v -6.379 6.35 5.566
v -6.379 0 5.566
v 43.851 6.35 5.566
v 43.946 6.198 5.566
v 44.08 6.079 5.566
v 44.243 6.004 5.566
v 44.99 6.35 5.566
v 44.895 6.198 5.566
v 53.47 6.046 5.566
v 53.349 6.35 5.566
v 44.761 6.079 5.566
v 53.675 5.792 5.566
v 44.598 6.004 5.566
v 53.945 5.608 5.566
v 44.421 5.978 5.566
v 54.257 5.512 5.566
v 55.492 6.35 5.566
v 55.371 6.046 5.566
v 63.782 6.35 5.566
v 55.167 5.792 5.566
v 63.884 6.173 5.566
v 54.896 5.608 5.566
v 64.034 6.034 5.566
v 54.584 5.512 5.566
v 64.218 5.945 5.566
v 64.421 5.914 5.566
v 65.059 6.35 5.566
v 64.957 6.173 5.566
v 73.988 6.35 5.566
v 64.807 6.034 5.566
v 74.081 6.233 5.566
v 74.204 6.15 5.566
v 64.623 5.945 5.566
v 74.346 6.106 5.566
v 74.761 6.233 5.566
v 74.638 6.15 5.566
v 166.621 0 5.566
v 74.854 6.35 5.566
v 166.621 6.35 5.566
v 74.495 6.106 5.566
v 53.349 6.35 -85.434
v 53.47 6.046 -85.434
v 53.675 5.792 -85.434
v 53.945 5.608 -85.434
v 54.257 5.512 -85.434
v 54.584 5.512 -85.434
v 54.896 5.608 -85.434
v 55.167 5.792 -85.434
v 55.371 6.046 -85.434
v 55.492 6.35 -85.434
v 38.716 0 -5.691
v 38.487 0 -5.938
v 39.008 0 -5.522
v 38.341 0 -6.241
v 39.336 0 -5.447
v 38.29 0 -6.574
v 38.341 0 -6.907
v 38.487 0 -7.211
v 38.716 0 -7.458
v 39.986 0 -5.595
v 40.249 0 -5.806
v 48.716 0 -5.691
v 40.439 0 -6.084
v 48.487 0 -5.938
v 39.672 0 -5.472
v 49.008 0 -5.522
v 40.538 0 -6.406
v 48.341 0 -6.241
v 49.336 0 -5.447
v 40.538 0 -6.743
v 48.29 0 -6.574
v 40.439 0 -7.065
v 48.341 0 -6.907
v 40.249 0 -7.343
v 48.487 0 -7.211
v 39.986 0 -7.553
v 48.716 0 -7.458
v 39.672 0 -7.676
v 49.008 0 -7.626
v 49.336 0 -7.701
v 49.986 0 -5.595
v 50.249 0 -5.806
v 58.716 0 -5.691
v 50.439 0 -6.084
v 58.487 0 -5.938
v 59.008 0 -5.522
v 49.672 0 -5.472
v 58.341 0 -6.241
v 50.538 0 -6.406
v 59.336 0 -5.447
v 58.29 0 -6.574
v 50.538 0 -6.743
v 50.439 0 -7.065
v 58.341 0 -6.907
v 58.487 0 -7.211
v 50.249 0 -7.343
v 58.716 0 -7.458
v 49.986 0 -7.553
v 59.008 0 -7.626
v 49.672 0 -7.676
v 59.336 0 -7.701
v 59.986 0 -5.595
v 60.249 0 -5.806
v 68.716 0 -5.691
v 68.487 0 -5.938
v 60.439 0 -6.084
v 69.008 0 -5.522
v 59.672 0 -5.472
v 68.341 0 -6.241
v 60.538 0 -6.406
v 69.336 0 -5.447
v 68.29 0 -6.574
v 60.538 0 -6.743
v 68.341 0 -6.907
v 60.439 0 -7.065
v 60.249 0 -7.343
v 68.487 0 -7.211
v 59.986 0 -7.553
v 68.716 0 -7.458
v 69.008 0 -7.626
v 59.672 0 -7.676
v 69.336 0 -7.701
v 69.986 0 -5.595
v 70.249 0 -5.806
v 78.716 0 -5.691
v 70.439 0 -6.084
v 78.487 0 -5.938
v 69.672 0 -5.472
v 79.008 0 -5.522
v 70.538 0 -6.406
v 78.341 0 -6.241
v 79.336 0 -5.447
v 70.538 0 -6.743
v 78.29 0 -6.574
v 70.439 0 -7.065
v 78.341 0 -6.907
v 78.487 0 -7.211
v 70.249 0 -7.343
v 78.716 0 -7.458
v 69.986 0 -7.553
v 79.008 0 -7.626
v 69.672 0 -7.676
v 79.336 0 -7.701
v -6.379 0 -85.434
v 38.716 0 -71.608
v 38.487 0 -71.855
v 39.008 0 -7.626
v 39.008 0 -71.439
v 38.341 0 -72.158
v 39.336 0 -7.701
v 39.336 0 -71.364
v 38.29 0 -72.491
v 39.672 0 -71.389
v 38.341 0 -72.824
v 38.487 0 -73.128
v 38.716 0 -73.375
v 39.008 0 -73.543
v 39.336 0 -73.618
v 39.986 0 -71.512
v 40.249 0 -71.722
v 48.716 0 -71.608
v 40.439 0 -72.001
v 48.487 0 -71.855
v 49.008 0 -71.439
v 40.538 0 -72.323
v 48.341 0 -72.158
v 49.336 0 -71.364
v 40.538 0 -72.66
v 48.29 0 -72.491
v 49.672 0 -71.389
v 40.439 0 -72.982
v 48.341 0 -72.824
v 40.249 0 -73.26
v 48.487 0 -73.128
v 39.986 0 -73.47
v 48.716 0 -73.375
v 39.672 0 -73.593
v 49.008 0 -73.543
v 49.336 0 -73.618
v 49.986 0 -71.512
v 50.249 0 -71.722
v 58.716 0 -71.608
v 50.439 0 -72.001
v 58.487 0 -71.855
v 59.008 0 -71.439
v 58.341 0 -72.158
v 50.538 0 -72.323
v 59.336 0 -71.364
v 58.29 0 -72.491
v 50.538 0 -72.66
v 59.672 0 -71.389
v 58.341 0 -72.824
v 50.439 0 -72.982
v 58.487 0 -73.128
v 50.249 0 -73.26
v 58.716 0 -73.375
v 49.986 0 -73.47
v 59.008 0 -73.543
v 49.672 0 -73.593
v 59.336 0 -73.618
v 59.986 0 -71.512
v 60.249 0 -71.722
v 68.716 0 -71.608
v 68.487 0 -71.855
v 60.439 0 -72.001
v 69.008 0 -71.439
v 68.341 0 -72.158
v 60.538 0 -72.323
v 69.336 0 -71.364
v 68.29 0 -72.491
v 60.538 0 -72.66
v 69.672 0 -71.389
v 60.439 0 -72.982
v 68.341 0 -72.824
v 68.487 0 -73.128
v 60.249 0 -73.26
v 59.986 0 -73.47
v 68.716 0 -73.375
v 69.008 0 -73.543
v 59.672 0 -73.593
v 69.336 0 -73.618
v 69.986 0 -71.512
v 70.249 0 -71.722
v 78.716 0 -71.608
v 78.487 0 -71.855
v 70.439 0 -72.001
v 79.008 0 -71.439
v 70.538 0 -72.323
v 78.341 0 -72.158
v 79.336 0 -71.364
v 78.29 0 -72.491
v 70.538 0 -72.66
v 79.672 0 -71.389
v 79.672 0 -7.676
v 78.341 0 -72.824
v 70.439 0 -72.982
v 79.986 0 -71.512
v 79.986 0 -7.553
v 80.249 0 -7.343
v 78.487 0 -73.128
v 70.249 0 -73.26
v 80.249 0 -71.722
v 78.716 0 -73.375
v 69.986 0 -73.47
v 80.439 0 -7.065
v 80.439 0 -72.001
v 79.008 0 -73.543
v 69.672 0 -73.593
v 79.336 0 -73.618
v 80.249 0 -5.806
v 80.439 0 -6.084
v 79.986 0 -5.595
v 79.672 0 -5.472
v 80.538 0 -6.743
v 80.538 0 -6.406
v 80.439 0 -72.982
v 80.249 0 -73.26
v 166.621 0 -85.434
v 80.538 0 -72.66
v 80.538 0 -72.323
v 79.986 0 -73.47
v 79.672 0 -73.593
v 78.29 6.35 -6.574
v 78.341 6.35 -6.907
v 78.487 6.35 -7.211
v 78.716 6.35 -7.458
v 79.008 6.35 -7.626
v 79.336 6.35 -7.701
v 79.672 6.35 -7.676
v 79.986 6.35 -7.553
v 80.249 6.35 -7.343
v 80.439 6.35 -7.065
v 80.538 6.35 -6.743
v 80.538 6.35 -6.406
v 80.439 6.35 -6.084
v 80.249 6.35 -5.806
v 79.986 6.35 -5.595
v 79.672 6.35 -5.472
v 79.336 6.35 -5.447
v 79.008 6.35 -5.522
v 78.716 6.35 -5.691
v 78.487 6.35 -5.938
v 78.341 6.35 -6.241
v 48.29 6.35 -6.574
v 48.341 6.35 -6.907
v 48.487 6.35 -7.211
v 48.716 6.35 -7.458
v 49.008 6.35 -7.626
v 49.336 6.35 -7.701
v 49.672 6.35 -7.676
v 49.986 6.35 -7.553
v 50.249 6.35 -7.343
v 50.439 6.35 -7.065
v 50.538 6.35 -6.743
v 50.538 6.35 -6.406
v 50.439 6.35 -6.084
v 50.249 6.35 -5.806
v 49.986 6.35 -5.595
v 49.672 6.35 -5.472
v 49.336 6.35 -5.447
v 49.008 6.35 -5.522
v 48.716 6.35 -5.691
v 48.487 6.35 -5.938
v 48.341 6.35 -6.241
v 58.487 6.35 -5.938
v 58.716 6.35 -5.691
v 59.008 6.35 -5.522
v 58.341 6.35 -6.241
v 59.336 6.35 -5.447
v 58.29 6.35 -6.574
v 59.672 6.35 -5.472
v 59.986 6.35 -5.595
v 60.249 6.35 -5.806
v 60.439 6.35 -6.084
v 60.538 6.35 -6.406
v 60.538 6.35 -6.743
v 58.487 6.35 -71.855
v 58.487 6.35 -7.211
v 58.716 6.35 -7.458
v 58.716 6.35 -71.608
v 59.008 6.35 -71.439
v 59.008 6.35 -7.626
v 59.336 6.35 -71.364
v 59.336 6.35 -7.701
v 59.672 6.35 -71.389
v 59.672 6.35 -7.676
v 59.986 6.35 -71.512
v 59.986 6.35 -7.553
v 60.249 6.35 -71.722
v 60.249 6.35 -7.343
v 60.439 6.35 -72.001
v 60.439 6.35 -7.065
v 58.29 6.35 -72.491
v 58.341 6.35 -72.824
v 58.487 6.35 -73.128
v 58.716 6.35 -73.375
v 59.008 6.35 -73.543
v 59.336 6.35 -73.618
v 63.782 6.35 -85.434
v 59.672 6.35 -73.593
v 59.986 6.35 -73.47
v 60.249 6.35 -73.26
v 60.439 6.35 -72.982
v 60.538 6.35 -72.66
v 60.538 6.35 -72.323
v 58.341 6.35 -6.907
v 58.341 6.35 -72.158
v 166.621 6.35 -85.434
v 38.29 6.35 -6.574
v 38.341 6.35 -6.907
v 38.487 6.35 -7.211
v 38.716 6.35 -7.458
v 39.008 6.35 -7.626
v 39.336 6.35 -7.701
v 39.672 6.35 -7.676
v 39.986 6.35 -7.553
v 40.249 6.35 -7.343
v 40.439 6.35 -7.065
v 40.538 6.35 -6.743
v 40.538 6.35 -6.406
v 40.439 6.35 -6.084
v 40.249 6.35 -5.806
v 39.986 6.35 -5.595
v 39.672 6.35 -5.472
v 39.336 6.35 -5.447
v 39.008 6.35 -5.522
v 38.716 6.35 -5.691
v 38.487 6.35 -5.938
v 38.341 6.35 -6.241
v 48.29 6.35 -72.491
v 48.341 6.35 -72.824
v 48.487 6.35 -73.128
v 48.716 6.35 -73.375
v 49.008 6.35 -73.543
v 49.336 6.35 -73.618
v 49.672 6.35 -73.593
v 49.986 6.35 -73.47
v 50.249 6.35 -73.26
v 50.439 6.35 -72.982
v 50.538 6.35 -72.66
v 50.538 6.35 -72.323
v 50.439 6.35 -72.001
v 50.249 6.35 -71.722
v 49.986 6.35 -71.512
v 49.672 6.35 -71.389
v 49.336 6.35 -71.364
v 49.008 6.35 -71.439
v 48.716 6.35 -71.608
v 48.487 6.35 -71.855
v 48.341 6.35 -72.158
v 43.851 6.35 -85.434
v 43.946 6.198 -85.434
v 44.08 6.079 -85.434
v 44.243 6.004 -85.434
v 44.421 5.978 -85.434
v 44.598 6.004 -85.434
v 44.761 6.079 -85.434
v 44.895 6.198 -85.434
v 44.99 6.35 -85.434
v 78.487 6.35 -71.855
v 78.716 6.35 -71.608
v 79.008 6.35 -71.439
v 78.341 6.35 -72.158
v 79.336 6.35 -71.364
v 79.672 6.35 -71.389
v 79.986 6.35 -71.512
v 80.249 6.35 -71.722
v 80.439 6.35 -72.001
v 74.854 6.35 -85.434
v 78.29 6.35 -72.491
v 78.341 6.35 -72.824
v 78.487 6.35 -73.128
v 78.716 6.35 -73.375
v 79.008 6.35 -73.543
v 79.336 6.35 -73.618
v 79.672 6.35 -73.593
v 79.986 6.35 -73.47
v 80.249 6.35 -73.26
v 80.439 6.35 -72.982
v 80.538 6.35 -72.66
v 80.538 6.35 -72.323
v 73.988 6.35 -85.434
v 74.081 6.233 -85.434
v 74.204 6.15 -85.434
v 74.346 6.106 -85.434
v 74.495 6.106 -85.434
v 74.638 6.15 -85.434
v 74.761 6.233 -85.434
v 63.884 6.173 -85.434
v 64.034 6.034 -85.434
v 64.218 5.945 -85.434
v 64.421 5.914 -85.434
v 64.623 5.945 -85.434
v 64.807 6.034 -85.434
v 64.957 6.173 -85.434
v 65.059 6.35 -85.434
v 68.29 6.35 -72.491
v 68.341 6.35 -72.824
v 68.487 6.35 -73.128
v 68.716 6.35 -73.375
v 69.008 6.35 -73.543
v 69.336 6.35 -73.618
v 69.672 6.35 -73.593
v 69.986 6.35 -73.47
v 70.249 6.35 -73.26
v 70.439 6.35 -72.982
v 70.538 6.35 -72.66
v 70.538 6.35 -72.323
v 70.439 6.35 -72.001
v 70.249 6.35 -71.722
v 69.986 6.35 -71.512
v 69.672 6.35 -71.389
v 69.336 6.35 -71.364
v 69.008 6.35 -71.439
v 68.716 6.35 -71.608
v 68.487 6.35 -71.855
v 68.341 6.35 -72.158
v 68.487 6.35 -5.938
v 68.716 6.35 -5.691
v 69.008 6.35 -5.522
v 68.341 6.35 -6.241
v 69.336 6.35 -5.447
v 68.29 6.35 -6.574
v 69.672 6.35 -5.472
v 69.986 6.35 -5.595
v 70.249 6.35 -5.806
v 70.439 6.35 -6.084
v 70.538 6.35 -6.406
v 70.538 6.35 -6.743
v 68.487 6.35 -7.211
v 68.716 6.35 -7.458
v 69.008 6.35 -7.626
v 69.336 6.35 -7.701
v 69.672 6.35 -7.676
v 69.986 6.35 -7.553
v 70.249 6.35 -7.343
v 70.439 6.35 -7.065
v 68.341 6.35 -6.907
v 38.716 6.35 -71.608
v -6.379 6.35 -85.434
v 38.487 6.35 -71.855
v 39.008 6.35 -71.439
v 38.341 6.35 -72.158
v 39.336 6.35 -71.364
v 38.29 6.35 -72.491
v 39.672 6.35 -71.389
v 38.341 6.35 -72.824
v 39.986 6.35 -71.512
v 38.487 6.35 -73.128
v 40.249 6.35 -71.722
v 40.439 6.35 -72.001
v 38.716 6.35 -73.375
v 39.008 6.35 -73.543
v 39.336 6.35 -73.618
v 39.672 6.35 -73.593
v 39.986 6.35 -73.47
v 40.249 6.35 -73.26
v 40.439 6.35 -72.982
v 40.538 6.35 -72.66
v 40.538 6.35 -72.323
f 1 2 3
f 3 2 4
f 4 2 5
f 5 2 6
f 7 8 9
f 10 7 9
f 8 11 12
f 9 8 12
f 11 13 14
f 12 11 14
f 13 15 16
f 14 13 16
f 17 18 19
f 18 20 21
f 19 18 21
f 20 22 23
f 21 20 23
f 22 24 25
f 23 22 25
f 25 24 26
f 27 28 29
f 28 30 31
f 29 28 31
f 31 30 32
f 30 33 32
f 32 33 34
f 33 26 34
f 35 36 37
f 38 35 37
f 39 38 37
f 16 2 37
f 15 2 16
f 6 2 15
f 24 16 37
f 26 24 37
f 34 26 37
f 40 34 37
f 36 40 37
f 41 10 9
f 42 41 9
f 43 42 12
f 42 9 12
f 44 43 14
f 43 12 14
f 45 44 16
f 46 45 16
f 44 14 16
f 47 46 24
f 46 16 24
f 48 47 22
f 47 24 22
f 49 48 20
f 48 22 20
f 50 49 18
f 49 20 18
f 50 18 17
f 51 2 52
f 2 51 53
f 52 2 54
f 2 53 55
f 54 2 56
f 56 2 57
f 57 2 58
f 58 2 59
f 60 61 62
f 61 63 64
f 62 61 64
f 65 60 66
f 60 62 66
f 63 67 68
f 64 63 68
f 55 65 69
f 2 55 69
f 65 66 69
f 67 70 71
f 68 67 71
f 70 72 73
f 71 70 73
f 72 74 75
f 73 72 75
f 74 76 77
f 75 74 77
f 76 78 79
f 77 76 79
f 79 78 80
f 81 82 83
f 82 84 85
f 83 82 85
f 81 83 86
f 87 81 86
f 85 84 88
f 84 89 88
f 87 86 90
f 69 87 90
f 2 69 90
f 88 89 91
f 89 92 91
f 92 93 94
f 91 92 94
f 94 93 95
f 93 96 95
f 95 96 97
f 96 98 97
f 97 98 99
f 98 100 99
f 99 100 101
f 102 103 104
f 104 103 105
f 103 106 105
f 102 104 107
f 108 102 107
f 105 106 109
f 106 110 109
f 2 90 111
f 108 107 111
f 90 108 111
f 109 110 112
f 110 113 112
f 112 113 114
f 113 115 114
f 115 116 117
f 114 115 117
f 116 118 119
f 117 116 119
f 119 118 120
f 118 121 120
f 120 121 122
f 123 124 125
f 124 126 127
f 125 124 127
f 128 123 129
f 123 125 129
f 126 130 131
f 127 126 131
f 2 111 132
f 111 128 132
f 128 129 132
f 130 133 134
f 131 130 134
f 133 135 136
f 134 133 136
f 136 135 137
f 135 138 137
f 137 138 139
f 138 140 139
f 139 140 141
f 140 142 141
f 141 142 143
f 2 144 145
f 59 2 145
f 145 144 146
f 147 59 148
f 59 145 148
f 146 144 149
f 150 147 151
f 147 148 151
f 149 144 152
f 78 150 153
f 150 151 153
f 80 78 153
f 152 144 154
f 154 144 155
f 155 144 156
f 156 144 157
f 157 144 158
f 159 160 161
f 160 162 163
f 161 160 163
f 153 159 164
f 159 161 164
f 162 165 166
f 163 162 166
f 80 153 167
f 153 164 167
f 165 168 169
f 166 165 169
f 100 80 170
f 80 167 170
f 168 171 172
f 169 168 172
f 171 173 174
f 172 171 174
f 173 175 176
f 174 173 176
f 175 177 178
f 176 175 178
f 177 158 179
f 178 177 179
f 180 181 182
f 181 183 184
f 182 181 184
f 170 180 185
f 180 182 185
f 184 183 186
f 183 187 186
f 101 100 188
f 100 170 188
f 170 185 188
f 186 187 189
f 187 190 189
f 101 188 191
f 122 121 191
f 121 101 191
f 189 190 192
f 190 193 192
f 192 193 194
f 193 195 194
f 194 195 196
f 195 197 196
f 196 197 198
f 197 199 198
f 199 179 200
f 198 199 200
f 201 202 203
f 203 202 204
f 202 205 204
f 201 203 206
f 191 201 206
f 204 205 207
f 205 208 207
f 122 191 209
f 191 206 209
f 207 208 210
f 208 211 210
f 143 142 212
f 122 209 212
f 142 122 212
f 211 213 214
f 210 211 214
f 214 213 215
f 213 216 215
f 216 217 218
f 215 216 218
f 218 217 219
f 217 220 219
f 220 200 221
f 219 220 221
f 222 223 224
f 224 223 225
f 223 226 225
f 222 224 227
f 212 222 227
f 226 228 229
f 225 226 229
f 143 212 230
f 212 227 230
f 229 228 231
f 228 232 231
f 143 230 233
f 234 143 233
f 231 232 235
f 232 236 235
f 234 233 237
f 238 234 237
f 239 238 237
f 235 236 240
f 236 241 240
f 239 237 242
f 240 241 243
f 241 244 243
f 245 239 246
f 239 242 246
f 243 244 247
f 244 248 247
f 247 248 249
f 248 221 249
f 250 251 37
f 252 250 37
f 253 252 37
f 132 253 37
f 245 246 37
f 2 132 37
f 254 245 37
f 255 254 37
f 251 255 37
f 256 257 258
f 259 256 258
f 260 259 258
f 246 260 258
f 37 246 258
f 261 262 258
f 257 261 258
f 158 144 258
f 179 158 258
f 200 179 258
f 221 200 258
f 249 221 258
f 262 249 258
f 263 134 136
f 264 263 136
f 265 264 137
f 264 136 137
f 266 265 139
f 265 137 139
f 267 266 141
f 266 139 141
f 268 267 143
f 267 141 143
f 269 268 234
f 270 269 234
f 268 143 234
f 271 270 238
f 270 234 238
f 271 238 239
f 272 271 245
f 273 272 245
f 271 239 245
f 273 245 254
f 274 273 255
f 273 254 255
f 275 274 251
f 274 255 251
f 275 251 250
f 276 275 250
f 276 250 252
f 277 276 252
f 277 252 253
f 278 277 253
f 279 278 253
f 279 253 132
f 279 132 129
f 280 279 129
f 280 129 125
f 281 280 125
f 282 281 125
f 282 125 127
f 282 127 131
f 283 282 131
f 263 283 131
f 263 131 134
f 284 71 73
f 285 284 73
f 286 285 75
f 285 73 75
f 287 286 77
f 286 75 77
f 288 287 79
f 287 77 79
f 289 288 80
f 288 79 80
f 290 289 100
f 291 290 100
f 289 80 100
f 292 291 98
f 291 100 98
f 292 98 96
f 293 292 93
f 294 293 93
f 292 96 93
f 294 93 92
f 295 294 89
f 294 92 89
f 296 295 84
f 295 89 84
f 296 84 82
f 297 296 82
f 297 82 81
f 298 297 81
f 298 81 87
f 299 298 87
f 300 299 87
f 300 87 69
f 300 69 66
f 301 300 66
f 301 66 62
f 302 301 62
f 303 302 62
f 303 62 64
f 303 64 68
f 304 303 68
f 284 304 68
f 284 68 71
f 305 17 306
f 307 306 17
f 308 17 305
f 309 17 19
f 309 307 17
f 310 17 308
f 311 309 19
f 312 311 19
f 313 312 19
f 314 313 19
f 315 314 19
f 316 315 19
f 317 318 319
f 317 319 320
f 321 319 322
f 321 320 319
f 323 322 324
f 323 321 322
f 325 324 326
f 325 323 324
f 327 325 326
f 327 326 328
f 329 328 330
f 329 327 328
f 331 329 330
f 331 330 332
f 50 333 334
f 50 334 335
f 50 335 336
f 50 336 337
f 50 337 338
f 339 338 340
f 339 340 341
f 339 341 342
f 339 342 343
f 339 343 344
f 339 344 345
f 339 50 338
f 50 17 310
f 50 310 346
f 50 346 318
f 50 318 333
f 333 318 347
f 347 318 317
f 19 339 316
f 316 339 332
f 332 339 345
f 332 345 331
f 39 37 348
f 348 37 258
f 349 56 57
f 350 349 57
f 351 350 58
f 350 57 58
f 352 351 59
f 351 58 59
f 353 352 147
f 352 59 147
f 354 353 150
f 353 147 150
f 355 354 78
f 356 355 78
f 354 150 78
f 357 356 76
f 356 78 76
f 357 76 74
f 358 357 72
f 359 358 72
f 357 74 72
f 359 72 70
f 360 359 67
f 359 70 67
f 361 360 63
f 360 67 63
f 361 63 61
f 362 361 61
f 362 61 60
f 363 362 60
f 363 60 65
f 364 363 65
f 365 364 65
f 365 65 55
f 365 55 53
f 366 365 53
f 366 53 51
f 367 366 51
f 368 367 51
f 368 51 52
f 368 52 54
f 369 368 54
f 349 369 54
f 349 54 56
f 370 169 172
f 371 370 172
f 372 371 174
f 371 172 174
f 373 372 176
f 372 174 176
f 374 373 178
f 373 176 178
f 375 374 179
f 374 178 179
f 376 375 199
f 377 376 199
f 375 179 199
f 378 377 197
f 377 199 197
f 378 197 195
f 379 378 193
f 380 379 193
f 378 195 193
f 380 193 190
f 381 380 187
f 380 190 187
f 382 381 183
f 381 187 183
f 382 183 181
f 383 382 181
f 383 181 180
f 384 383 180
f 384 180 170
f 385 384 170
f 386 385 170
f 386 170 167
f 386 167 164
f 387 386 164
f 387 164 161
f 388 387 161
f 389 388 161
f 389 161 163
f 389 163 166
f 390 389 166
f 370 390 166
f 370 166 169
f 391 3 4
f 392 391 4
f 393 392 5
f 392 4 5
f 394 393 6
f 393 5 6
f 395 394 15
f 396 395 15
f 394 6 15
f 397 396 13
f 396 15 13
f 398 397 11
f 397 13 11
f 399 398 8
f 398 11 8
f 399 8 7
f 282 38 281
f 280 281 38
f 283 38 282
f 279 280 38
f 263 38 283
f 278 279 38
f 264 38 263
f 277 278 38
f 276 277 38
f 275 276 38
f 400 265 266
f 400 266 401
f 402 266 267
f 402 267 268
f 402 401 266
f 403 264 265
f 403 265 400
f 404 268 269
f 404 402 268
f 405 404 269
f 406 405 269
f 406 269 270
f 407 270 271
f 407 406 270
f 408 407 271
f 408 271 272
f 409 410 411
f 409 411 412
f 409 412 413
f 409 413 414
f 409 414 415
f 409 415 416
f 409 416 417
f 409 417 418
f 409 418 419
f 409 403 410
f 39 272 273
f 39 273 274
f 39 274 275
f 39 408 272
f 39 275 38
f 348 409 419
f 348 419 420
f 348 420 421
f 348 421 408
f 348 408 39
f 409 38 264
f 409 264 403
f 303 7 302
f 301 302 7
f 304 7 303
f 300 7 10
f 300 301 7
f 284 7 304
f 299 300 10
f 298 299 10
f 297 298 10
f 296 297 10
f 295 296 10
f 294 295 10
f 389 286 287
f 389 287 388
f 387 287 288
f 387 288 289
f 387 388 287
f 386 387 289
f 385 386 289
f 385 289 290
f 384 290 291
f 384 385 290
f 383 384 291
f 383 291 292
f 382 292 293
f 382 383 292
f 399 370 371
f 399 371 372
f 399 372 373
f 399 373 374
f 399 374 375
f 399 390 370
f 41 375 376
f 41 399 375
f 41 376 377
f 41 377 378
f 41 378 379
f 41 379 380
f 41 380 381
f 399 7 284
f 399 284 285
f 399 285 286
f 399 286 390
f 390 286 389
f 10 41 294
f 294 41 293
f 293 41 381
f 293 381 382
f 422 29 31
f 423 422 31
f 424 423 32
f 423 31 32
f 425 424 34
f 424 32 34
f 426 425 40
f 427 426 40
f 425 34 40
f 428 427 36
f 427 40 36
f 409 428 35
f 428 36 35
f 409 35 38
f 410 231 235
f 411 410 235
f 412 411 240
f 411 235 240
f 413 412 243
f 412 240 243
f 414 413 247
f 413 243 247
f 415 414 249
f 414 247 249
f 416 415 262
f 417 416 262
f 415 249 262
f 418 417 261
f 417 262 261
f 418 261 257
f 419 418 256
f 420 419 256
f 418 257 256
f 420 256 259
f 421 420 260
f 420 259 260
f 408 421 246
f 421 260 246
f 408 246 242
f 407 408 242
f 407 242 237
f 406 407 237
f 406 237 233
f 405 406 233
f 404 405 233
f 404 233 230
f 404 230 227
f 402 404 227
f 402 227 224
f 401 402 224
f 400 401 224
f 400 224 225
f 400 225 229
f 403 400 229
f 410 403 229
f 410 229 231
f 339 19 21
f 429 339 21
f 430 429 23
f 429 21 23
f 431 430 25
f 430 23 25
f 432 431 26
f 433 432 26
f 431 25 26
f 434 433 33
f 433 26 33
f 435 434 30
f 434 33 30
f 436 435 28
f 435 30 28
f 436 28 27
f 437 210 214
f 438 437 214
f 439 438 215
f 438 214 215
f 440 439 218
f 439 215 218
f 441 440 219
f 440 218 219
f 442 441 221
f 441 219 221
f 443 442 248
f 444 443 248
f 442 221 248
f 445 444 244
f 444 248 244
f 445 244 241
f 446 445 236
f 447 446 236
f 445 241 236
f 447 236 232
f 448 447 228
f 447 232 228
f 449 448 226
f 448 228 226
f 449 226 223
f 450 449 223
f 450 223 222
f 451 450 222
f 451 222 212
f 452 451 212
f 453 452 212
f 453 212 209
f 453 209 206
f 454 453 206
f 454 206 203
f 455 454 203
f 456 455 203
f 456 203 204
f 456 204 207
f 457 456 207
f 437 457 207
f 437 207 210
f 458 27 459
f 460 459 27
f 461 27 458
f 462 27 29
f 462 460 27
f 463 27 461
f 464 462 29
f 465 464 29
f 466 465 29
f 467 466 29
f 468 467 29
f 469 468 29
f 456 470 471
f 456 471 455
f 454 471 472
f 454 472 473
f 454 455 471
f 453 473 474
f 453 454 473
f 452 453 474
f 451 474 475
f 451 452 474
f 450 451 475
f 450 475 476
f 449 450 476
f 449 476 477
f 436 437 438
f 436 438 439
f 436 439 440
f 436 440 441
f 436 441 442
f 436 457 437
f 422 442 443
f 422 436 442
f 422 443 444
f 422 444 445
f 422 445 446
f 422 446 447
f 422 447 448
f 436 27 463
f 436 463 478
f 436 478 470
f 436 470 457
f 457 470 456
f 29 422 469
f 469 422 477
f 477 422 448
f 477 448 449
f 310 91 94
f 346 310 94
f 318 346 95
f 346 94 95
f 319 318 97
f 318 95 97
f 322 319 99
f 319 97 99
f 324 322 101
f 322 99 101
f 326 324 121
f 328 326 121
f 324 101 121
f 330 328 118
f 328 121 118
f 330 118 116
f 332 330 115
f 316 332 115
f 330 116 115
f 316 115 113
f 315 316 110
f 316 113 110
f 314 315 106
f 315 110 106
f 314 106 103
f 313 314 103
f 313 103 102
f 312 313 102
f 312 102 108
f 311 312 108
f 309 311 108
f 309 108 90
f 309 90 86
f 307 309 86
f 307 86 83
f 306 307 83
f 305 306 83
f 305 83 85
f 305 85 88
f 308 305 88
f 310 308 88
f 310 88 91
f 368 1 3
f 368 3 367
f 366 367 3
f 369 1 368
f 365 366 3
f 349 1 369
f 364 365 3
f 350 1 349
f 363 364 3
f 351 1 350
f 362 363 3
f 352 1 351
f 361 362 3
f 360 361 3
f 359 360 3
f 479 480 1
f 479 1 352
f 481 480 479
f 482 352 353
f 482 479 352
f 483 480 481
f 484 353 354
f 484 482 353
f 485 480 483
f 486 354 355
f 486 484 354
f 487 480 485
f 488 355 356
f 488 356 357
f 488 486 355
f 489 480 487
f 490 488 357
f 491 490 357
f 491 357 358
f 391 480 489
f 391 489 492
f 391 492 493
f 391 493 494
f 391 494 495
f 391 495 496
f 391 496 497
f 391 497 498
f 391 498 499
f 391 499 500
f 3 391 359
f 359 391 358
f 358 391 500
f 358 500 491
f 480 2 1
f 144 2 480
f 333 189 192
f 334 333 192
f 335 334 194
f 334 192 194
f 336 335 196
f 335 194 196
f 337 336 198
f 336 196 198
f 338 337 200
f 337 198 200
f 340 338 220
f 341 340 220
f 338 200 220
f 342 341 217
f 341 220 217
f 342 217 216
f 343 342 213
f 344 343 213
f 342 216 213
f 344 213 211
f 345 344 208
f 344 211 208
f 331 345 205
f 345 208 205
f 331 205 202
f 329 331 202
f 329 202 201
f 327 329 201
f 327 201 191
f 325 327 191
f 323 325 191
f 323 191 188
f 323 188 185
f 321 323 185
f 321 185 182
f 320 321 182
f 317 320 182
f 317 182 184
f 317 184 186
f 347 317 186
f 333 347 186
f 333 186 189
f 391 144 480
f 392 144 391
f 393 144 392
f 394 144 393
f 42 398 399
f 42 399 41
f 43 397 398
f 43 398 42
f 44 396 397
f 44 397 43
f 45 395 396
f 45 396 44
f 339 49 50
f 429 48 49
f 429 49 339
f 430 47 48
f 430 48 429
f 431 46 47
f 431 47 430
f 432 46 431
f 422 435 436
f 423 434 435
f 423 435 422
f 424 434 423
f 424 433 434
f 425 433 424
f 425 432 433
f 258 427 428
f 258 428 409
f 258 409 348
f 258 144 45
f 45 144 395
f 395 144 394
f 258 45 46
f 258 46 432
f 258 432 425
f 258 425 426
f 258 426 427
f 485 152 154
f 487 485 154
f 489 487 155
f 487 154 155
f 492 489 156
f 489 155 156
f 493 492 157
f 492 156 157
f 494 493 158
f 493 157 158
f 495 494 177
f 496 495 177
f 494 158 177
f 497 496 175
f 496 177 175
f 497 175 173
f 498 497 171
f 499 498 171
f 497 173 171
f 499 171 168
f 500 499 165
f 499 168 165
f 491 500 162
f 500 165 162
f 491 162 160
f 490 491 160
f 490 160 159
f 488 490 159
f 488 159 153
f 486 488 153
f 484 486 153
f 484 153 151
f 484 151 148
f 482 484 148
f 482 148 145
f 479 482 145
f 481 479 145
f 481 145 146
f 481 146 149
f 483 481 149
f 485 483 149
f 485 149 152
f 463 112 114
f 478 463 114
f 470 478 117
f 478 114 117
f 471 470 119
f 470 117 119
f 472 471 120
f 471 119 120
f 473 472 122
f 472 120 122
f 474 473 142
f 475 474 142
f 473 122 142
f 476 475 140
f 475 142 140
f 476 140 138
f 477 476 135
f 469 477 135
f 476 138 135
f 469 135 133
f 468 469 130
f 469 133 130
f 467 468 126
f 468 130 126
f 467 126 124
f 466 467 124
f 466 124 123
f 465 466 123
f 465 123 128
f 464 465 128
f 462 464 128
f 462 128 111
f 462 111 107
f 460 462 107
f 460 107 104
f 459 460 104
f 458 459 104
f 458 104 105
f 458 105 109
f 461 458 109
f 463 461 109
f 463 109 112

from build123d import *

# Parameters (mm, degrees)
SKETCH1_W             = 173
SKETCH1_H             = 91
BOSS_EXTRUDE1_DEPTH   = 6.35
SKETCH2_R             = 0.6223
SKETCH2_R_2           = 1.1
SKETCH2_R_3           = 0.6858
SKETCH2_R_4           = 0.5
CUT_EXTRUDE1_DEPTH    = 92
F_4_40_TAPPED_HOLE1_D = 2.2606


with BuildPart() as part:
    # Sketch1 → Boss-Extrude1 (new body)
    with BuildSketch(Plane(origin=(0, 0, 0), x_dir=(1, 0, 0), z_dir=(0, 1, 0))):
        with Locations((80.120618557, 39.933676976)):
            Rectangle(SKETCH1_W, SKETCH1_H)
    extrude(amount=BOSS_EXTRUDE1_DEPTH)

    # Sketch2 → Cut-Extrude1 (cut, through all)
    with BuildSketch(Plane.XY.offset(5.566323024)):
        with Locations((44.420618557, 6.6)):
            Circle(SKETCH2_R)
        with Locations((54.420618557, 6.6)):
            Circle(SKETCH2_R_2)
        with Locations((64.420618557, 6.6)):
            Circle(SKETCH2_R_3)
        with Locations((74.420618557, 6.6)):
            Circle(SKETCH2_R_4)
    extrude(amount=-CUT_EXTRUDE1_DEPTH, mode=Mode.SUBTRACT)

    # #4-40 Tapped Hole1 (through all)
    with Locations(Plane(origin=(0, 6.35, 0), x_dir=(1, 0, 0), z_dir=(0, 1, 0))):
        with Locations((39.420618557, 72.491246031), (59.420618557, 72.491246031), (49.420618557, 72.491246031), (49.420618557, 6.5743166), (39.420618557, 6.5743166), (59.420618557, 6.5743166), (69.420618557, 72.491246031), (79.420618557, 72.491246031), (69.420618557, 6.5743166), (79.420618557, 6.5743166)):
            Hole(F_4_40_TAPPED_HOLE1_D / 2)


solid = part.part
